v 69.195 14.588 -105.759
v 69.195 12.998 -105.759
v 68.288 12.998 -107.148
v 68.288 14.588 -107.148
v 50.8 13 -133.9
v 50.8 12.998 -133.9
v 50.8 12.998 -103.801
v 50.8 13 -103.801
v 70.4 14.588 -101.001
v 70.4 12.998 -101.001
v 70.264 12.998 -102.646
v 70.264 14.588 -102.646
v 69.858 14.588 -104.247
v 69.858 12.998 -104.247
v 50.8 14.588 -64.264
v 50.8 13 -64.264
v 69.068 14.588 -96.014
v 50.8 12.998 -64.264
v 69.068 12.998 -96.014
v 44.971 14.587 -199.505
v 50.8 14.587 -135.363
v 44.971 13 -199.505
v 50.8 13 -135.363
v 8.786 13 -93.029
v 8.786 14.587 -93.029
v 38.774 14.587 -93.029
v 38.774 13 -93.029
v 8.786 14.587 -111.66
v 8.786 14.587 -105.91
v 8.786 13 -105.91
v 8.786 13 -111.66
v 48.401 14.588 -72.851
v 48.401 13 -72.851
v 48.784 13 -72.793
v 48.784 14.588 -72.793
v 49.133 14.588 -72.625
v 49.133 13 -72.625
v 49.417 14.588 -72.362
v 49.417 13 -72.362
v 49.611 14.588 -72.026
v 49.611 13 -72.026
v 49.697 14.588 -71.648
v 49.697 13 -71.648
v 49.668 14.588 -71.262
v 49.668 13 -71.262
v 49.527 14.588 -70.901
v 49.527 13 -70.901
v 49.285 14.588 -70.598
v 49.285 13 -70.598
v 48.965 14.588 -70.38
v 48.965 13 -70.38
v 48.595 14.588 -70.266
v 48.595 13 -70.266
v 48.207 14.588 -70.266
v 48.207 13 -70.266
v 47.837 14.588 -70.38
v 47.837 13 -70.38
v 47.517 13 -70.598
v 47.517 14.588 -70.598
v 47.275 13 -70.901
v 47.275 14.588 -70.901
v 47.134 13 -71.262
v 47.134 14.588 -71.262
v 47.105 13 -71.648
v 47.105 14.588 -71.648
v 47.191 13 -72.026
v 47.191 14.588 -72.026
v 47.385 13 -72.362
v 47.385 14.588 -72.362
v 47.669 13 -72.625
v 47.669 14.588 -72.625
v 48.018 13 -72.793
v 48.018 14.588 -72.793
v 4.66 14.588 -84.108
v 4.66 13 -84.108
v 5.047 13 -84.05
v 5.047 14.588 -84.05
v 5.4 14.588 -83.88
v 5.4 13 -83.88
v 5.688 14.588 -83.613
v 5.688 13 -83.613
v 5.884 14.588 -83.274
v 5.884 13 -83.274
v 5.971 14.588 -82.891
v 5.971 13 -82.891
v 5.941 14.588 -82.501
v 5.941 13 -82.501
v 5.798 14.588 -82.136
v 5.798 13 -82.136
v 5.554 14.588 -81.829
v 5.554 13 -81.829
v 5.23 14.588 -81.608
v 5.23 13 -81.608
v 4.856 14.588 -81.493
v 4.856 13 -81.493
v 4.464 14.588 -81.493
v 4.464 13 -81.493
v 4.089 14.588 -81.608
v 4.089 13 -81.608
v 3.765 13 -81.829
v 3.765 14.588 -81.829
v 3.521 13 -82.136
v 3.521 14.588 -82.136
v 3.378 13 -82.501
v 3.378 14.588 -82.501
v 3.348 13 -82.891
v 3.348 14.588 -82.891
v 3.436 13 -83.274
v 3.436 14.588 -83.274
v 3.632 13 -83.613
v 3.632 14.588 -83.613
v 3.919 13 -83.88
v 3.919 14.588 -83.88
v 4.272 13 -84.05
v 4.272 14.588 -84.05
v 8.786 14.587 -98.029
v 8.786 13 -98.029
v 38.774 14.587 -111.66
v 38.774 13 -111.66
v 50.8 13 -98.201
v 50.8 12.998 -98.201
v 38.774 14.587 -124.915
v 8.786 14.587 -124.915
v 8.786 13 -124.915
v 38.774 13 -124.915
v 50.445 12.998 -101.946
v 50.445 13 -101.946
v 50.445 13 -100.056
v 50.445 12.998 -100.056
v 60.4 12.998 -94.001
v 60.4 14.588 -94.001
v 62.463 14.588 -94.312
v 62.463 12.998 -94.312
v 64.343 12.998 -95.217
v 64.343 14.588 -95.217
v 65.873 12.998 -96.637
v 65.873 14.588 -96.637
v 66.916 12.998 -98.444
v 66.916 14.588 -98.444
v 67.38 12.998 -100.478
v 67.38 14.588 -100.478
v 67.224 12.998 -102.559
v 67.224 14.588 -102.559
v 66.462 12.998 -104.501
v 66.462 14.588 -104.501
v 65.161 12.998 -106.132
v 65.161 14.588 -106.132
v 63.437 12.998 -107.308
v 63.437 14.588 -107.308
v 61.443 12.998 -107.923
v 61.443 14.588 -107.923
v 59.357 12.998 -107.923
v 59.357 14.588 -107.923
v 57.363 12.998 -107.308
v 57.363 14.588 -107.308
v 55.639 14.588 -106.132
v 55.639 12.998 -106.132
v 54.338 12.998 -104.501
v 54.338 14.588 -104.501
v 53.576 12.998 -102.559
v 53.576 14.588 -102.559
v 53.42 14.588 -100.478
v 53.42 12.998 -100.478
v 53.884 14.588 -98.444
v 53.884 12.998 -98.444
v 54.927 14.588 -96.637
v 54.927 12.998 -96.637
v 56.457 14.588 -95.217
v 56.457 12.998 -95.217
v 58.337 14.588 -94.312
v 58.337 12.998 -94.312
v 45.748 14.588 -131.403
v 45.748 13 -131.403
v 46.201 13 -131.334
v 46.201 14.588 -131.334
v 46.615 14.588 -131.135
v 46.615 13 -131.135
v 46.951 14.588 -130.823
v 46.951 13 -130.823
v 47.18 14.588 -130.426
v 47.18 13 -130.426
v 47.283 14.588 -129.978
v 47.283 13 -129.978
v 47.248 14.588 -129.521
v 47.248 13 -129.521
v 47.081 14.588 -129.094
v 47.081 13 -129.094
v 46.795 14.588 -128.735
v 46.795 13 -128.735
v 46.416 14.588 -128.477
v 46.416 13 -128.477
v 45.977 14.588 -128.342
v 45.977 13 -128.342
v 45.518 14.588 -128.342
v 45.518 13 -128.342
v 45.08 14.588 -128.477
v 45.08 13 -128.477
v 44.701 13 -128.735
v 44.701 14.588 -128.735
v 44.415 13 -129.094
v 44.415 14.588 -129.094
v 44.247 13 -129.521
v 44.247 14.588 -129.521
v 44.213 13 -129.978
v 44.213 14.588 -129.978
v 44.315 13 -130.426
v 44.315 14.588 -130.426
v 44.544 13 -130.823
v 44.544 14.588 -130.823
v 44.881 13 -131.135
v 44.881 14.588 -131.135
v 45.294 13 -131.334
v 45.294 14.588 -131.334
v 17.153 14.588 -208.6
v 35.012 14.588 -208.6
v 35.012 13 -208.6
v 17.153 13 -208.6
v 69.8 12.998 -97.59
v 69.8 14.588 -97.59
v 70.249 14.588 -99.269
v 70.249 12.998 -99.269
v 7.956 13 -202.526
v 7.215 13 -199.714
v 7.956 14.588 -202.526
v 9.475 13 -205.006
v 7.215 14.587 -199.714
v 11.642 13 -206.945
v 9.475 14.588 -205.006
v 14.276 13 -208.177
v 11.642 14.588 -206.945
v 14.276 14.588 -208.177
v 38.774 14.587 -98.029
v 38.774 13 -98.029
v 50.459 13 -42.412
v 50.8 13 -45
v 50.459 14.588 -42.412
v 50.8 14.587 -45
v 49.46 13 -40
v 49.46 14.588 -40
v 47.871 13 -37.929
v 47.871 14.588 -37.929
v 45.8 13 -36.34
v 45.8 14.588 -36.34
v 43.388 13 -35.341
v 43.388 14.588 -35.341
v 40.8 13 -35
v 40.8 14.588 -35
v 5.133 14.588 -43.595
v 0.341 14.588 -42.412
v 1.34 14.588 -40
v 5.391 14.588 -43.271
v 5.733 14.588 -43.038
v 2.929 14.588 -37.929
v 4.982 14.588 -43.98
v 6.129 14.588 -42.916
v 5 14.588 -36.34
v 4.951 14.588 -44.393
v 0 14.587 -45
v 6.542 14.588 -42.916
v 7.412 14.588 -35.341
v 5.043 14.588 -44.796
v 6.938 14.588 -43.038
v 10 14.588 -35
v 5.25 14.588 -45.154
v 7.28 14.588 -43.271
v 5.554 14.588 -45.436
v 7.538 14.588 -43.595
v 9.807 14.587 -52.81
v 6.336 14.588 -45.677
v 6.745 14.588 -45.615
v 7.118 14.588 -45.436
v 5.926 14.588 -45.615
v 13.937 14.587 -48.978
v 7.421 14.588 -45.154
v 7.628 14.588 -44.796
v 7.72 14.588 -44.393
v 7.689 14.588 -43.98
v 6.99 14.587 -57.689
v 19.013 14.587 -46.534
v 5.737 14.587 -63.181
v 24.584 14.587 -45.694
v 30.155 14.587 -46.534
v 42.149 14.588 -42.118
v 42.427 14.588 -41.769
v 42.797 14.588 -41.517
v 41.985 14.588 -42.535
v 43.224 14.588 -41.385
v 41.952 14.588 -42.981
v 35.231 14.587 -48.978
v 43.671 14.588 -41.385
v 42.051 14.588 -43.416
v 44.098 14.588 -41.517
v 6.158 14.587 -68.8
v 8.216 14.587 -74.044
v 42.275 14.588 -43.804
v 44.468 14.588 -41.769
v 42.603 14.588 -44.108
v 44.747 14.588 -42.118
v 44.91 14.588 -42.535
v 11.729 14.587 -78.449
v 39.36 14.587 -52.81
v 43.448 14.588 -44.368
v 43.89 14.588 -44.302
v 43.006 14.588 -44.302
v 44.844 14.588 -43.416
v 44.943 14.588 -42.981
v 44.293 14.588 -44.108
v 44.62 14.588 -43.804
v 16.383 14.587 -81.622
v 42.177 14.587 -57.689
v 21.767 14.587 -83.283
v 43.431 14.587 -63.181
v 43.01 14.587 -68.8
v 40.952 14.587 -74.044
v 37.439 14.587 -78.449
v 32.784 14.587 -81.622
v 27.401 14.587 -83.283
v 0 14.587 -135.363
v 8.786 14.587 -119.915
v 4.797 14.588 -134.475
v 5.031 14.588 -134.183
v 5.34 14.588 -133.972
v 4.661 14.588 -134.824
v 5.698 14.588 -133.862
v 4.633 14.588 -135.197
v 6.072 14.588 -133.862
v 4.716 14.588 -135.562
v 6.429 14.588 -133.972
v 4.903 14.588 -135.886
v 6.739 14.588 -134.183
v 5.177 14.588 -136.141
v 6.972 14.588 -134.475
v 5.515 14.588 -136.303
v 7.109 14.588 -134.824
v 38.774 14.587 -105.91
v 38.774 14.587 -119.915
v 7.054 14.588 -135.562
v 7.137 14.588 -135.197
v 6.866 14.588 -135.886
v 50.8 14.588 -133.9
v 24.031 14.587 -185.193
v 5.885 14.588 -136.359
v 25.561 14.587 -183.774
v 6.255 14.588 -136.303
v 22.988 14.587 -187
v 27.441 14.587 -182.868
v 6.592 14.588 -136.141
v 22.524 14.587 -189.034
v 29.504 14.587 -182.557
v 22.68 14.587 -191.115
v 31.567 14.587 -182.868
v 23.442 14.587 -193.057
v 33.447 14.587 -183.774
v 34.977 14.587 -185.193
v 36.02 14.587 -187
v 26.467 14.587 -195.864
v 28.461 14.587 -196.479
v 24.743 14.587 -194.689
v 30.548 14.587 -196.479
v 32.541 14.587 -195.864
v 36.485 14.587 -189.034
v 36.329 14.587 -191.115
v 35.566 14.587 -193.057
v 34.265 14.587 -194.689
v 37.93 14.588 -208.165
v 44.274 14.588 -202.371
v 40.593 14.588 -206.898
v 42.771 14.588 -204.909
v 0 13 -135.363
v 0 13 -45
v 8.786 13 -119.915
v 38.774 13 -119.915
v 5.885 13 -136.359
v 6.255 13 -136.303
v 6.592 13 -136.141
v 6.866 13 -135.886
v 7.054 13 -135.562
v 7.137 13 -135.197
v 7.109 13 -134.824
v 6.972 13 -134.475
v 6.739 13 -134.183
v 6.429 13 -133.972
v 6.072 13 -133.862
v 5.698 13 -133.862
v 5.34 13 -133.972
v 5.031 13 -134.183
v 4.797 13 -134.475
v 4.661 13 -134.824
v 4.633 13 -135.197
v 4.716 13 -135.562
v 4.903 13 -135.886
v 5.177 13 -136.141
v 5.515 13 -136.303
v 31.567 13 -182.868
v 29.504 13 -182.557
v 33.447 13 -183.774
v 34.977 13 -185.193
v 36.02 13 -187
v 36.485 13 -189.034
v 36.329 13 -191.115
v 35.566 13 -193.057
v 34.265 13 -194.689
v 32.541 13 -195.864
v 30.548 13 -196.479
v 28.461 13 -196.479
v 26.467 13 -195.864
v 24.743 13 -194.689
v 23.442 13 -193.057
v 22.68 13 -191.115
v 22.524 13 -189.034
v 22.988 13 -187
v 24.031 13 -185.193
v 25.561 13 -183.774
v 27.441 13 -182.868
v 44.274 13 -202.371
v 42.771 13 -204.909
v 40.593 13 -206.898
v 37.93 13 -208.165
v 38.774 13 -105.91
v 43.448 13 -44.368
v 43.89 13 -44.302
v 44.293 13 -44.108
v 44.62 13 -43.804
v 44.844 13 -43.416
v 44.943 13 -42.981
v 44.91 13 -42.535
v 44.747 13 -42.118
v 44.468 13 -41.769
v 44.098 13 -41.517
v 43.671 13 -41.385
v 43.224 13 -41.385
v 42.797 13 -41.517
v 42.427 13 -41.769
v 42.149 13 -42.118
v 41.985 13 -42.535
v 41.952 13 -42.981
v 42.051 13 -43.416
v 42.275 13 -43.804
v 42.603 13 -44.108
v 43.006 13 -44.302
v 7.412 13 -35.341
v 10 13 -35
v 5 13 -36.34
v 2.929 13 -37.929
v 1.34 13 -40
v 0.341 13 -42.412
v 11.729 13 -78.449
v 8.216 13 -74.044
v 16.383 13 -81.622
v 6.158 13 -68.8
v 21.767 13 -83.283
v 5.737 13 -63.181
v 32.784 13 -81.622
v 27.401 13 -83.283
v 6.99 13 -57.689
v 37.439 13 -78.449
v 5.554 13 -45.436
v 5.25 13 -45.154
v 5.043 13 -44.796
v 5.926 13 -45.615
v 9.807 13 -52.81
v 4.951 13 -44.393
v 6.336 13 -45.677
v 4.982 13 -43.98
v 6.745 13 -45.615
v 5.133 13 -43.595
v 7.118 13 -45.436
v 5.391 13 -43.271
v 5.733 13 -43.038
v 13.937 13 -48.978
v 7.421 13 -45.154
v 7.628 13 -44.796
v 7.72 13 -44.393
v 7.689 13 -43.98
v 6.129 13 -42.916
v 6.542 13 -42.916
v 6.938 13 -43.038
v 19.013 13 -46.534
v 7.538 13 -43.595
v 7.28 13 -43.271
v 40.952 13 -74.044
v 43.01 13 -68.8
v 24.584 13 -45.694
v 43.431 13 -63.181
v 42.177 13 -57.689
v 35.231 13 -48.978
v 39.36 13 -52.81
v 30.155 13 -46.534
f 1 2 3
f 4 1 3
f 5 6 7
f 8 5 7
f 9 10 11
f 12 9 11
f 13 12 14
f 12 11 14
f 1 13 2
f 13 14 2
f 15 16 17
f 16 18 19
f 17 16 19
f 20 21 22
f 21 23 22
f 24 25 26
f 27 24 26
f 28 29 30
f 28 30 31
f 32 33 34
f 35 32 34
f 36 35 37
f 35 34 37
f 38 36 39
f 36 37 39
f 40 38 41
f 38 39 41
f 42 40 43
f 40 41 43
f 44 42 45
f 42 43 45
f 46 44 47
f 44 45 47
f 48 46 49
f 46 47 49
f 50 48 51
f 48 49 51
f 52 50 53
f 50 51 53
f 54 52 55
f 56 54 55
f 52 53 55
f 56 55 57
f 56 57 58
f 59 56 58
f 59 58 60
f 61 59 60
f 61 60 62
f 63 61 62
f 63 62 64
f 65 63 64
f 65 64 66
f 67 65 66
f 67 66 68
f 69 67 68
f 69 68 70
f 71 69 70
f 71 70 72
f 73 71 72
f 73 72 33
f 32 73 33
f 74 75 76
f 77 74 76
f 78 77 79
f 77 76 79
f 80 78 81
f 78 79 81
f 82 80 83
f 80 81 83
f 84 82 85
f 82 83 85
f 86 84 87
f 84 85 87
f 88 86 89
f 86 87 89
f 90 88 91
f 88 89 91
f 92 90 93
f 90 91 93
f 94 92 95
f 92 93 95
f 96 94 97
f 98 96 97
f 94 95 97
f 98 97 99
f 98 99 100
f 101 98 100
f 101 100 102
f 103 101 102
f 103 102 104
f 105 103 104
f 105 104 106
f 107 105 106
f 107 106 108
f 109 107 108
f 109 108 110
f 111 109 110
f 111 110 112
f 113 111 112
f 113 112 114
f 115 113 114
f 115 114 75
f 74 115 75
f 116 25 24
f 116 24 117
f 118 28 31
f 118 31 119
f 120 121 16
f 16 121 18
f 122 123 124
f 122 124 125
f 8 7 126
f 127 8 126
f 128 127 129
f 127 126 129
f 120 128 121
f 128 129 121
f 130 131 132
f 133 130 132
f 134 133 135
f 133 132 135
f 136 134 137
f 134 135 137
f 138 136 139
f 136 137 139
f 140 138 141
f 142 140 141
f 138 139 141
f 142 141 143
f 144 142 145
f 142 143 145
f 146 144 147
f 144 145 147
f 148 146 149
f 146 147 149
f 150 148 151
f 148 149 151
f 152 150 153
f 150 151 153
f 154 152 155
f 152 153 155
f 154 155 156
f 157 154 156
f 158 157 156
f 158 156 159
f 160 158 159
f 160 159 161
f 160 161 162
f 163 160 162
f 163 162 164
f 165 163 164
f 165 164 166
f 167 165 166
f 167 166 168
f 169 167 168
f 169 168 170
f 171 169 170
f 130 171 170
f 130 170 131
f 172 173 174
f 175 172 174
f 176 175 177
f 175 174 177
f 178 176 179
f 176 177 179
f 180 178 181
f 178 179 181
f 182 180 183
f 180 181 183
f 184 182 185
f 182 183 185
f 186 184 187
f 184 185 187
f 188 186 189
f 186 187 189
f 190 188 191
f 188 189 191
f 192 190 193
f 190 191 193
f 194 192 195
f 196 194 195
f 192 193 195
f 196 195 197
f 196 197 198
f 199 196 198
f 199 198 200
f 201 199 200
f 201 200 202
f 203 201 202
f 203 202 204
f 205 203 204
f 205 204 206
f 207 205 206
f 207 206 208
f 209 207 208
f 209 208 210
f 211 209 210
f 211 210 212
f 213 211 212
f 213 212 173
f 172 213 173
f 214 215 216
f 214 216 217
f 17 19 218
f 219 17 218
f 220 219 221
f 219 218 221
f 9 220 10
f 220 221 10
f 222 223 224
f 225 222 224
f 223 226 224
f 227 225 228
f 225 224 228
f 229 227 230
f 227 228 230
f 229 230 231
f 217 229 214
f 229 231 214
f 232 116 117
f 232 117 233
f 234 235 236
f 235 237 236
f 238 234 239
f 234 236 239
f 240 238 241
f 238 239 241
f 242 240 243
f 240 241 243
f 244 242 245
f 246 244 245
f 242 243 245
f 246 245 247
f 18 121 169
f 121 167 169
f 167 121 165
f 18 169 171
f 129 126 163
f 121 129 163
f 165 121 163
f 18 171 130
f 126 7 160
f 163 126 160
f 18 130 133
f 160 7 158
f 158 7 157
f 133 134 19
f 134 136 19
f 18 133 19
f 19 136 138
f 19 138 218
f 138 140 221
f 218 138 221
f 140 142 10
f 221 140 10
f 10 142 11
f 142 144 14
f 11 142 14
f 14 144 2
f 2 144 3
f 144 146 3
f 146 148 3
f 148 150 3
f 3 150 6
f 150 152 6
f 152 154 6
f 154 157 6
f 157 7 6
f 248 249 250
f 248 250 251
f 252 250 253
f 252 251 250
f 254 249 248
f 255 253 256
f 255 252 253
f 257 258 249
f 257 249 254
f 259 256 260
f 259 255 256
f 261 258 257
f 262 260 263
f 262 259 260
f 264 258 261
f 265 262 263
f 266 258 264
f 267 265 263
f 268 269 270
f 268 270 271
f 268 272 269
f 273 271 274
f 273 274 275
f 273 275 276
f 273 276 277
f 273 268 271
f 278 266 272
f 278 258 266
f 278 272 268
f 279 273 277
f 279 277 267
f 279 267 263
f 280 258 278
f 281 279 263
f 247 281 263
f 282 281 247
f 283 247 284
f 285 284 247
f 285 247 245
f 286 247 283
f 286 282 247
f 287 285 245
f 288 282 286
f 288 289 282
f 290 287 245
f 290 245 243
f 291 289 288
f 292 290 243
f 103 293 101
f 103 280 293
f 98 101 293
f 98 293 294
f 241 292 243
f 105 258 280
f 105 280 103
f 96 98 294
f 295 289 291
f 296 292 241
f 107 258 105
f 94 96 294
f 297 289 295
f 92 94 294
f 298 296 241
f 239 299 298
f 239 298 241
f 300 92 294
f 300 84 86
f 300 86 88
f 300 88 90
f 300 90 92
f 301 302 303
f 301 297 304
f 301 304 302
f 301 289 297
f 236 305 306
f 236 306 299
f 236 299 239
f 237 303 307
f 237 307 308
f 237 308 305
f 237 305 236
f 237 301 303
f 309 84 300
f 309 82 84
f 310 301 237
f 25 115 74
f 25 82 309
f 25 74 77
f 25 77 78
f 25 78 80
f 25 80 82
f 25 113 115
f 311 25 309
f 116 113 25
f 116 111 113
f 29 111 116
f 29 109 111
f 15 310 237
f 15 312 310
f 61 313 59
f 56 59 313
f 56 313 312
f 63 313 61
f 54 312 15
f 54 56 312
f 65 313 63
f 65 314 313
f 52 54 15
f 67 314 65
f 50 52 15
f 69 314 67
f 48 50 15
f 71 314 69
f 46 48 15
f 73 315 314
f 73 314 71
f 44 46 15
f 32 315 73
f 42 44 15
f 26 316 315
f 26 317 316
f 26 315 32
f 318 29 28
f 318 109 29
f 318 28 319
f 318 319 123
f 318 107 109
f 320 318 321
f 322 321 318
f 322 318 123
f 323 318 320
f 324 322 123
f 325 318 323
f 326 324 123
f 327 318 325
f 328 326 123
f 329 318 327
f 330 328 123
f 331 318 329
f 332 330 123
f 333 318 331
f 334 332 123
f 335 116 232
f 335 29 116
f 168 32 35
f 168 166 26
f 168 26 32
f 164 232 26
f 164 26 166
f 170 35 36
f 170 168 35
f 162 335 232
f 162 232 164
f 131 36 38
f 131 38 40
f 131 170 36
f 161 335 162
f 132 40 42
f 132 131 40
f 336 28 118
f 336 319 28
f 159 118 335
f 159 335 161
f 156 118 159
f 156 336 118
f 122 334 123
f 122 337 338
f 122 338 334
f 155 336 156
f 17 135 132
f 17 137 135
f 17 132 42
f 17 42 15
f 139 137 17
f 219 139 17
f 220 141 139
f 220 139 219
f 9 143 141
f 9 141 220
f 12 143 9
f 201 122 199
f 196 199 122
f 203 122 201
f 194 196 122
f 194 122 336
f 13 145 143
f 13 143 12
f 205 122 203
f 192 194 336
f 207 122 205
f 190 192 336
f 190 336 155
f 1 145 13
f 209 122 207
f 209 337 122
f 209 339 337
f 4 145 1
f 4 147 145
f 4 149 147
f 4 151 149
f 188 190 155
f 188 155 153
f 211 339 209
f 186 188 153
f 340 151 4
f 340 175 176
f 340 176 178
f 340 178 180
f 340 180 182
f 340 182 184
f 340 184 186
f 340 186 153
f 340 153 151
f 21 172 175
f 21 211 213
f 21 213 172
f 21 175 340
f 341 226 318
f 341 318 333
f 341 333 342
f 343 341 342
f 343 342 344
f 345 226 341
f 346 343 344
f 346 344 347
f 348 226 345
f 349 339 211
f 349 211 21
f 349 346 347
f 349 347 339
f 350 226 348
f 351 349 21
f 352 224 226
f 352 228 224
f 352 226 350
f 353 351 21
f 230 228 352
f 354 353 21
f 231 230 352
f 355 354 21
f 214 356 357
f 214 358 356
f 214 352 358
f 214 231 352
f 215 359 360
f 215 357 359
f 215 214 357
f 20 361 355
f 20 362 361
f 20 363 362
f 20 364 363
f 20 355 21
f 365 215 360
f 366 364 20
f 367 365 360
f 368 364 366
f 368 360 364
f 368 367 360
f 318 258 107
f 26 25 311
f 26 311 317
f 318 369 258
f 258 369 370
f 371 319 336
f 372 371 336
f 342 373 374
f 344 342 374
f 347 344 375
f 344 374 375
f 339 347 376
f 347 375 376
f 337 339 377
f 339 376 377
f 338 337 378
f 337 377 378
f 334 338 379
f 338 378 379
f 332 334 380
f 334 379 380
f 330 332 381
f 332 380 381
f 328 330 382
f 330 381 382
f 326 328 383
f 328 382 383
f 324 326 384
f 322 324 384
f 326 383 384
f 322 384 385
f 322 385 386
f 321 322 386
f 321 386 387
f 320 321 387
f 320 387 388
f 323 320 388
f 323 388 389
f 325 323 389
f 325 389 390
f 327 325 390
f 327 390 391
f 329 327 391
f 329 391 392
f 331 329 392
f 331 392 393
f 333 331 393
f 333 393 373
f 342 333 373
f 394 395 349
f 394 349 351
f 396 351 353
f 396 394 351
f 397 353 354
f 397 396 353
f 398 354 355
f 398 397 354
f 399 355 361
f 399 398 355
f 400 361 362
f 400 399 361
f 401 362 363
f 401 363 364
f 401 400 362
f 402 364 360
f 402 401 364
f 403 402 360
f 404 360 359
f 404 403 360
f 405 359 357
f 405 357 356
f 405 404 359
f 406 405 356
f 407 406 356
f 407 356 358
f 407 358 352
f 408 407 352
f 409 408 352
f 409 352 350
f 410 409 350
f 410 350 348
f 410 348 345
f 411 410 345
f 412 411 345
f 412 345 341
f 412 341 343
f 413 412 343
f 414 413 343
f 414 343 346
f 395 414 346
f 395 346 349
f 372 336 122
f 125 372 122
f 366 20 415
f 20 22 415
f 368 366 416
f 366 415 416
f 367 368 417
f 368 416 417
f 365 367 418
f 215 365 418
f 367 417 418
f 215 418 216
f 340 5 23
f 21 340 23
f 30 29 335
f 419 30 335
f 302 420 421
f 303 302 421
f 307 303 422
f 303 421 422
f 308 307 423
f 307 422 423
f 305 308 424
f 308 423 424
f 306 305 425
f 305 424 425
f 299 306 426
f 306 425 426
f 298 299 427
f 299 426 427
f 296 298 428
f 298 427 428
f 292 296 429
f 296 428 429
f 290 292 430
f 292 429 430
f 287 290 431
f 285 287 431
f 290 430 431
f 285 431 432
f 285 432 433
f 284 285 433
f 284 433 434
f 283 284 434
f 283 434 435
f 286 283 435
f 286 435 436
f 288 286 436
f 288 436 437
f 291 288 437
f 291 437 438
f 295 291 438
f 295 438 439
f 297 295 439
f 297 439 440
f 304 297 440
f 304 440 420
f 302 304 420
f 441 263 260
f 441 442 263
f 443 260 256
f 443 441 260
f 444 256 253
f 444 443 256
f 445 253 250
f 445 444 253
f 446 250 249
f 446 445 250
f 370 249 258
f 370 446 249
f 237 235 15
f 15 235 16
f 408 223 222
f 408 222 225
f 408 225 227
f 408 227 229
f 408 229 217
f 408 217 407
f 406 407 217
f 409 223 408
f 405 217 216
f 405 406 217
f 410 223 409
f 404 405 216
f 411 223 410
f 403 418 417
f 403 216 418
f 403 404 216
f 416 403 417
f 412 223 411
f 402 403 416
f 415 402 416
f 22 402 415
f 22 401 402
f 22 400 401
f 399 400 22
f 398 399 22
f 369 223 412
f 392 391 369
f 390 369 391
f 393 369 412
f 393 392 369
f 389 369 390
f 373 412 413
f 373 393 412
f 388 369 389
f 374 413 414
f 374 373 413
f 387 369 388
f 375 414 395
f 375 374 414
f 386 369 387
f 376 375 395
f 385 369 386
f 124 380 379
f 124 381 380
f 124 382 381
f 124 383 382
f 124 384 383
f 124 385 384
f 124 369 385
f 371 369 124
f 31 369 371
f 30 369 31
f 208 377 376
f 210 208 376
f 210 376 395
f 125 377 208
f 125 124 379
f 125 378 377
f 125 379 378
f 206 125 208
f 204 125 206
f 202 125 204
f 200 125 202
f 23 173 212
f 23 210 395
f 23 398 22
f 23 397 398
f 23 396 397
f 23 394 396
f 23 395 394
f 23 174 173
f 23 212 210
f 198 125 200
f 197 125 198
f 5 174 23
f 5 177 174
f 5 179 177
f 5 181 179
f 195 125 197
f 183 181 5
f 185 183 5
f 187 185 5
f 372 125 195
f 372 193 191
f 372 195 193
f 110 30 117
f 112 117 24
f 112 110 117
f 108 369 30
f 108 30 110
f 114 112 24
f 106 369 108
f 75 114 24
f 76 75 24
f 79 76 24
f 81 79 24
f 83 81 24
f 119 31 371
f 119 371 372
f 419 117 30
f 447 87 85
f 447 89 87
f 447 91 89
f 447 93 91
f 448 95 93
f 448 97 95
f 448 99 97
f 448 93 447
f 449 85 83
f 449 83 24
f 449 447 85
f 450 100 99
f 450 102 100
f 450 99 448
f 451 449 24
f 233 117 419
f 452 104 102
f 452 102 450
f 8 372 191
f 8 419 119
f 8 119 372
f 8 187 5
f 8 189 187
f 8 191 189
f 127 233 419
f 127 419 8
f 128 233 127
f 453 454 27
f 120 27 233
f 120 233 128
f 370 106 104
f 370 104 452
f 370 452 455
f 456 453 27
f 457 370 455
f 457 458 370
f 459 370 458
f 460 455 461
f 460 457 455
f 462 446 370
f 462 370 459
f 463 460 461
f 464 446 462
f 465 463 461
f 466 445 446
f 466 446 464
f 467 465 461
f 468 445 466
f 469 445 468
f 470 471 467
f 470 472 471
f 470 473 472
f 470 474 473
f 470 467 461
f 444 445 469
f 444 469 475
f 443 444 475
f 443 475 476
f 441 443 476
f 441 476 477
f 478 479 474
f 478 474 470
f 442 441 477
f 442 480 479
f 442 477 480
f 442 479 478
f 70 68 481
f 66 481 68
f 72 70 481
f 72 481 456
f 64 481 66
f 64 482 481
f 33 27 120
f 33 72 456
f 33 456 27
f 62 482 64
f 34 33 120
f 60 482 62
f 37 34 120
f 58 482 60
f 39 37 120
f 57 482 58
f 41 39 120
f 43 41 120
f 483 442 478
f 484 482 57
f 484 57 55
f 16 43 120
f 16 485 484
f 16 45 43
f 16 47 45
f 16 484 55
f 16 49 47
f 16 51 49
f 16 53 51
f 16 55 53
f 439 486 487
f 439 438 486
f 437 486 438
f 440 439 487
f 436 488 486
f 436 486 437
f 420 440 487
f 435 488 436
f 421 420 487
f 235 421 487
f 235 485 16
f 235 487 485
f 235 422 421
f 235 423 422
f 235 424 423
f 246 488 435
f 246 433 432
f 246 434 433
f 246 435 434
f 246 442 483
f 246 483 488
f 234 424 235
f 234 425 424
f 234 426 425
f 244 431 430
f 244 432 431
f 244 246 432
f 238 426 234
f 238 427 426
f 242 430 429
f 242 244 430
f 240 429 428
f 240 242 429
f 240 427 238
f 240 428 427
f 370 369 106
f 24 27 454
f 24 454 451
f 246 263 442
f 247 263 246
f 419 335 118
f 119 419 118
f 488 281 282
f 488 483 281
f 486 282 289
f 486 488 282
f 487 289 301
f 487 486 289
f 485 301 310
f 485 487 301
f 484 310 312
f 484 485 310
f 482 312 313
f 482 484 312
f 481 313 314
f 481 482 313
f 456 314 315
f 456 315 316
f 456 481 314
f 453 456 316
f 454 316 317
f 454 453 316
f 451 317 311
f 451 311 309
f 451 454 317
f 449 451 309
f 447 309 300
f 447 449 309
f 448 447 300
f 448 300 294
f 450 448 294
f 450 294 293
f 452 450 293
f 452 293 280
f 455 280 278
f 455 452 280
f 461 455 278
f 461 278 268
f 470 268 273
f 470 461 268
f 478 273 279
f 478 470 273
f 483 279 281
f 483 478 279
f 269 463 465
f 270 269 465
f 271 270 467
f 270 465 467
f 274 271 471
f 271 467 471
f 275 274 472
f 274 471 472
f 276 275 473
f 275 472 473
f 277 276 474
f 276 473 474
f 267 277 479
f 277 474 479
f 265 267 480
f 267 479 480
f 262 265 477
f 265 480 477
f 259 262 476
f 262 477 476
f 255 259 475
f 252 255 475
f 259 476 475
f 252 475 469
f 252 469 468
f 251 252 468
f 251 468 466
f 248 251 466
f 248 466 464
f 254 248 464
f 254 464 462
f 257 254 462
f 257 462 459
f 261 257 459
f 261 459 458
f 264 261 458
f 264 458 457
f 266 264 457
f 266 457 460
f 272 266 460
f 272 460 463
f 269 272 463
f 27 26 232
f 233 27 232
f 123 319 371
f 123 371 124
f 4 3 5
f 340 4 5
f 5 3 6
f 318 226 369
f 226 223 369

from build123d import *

# Parameters (mm, degrees)
SKETCH1_R           = 2.875
SKETCH1_R_2         = 7
BOSS_EXTRUDE1_DEPTH = 24.5875
SKETCH4_W           = 66.272407177
SKETCH4_H           = 27.800260981
CUT_EXTRUDE2_DEPTH  = 20
FILLET3_R           = 10
FILLET4_R           = 10
BOSS_EXTRUDE3_START = -1.5875
BOSS_EXTRUDE3_DEPTH = 1.5875
SKETCH7_R           = 7
CUT_EXTRUDE3_DEPTH  = 1.5875
CUT_EXTRUDE4_START  = -10
SKETCH8_R           = 3
SKETCH8_R_2         = 18.9
SKETCH8_R_3         = 2.875
SKETCH8_R_4         = 7
CUT_EXTRUDE4_DEPTH  = 10
SKETCH9_W           = 229.1070397
SKETCH9_H           = 361.266964835
SKETCH9_R           = 1.388229101
SKETCH9_R_2         = 1.483383261
SKETCH9_R_3         = 1.314910669
SKETCH9_R_4         = 1.248623853
SKETCH9_R_5         = 1.255629307
SKETCH9_R_6         = 1.53911217
CUT_EXTRUDE5_DEPTH  = 13
SKETCH10_W          = 29.988446547
SKETCH10_H          = 5
SKETCH10_H_2        = 5.75
CUT_EXTRUDE6_DEPTH  = 22
SKETCH11_R          = 5.236653548
CUT_EXTRUDE7_DEPTH  = 10
BOSS_EXTRUDE4_START = -1.59
BOSS_EXTRUDE4_DEPTH = 1.59
SKETCH13_R          = 7
CUT_EXTRUDE8_DEPTH  = 41
SKETCH14_W          = 61.491848917
SKETCH14_H          = 35.587491391
CUT_EXTRUDE9_DEPTH  = 20
FILLET5_R           = 10
SKETCH16_W          = 163.723031551
SKETCH16_H          = 22.872070304
CUT_EXTRUDE11_DEPTH = 35
FILLET6_R           = 10
SKETCH17_R          = 1.53911217
SKETCH17_R_2        = 1.255629307
SKETCH17_R_3        = 1.3
SKETCH17_R_4        = 1.314910669
SKETCH17_R_5        = 1.388229101
SKETCH17_R_6        = 1.5
CUT_EXTRUDE12_DEPTH = 42
CUT_EXTRUDE13_START = -30
SKETCH18_R          = 18.9
CUT_EXTRUDE13_DEPTH = 30


with BuildPart() as part:
    # Sketch1 → Boss-Extrude1 (new body)
    with BuildSketch(Plane(origin=(0, 0, 0), x_dir=(1, 0, 0), z_dir=(0, 1, 0))):
        with BuildLine():
            Line((42.32729629, 228.6), (10.454309325, 228.6))
            Line((10.454309325, 228.6), (0, 135.362739137))
            Line((0, 135.362739137), (0, 0))
            Line((0, 0), (24.327009544, 0))
            Line((24.327009544, 0), (50.8, 0))
            Line((50.8, 0), (50.8, 64.87909603))
            Line((50.8, 64.87909603), (50.8, 87.423477361))
            Line((50.8, 87.423477361), (50.8, 98.200996728))
            ThreePointArc((50.8, 98.200996728), (50.4, 101.000996728), (50.8, 103.800996728))
            Line((50.8, 103.800996728), (50.8, 104.488200565))
            Line((50.8, 104.488200565), (50.8, 120.619222808))
            Line((50.8, 120.619222808), (50.8, 135.362739137))
            Line((50.8, 135.362739137), (42.32729629, 228.6))
        make_face()
        with Locations(Location((24.101759227, 108.78493524, 0), (0, 0, 270))):
            Circle(SKETCH1_R, mode=Mode.SUBTRACT)
        with Locations(Location((29.504213454, 189.557234372, 0), (0, 0, 270))):
            Circle(SKETCH1_R_2, mode=Mode.SUBTRACT)
    extrude(amount=BOSS_EXTRUDE1_DEPTH)

    # Sketch4 → Cut-Extrude2 (cut)
    with BuildSketch(Plane(origin=(0, 0, -228.6), x_dir=(-1, 0, 0), z_dir=(0, 0, -1))):
        with Locations((-28.174690156, -1.980940155)):
            Rectangle(SKETCH4_W, SKETCH4_H)
    extrude(amount=-CUT_EXTRUDE2_DEPTH, mode=Mode.SUBTRACT)

    # Fillet3
    fillet3_edges = [part.edges().sort_by_distance(p)[0] for p in [
        (44.144746445, 5.959595168, -208.6),
    ]]
    fillet(fillet3_edges, radius=FILLET3_R)

    # Fillet4
    fillet4_edges = [part.edges().sort_by_distance(p)[0] for p in [
        (50.8, 12.29375, 0),
        (0, 12.29375, 0),
        (8.211791854, 5.959595168, -208.6),
    ]]
    fillet(fillet4_edges, radius=FILLET4_R)

    # Sketch6 → Boss-Extrude3 (add)
    with BuildSketch(Plane(origin=(0, 24.5875, 0), x_dir=(1, 0, 0), z_dir=(0, 1, 0)).offset(BOSS_EXTRUDE3_START)):
        with BuildLine():
            Line((50.8, 135.362739137), (50.8, 103.800996728))
            ThreePointArc((50.8, 103.800996728), (50.4, 101.000996728), (50.8, 98.200996728))
            Line((50.8, 98.200996728), (50.8, 61.124243317))
            Line((50.8, 61.124243317), (69.258211507, 96.360728536))
            ThreePointArc((69.258211507, 96.360728536), (70.393157133, 101.370875786), (68.890940865, 106.283413148))
            Line((68.890940865, 106.283413148), (50.8, 135.362739137))
        make_face()
    extrude(amount=BOSS_EXTRUDE3_DEPTH)

    # Sketch7 → Cut-Extrude3 (cut)
    with BuildSketch(Plane(origin=(0, 24.5875, 0), x_dir=(1, 0, 0), z_dir=(0, 1, 0))):
        with Locations(Location((60.4, 101.000996728, 0), (0, 0, 270))):
            Circle(SKETCH7_R)
    extrude(amount=-CUT_EXTRUDE3_DEPTH, mode=Mode.SUBTRACT)

    # Sketch8 → Cut-Extrude4 (cut)
    with BuildSketch(Plane(origin=(0, 24.5875, 0), x_dir=(1, 0, 0), z_dir=(0, 1, 0)).offset(CUT_EXTRUDE4_START)):
        with BuildLine():
            Line((10.454309325, 228.6), (0, 135.362739137))
            Line((0, 135.362739137), (0, 10))
            ThreePointArc((0, 10), (2.928932188, 2.928932188), (10, 0))
            Line((10, 0), (40.8, 0))
            ThreePointArc((40.8, 0), (47.871067812, 2.928932188), (50.8, 10))
            Line((50.8, 10), (50.8, 61.124243317))
            Line((50.8, 61.124243317), (69.258211507, 96.360728536))
            ThreePointArc((69.258211507, 96.360728536), (70.393157133, 101.370875786), (68.890940865, 106.283413148))
            Line((68.890940865, 106.283413148), (50.8, 135.362739137))
            Line((50.8, 135.362739137), (42.32729629, 228.6))
            Line((42.32729629, 228.6), (10.454309325, 228.6))
        make_face()
        with Locations(Location((9.492033273, 118.909935242, 0), (0, 0, 270))):
            Circle(SKETCH8_R, mode=Mode.SUBTRACT)
        with Locations(Location((24.583834565, 64.593886665, 0), (0, 0, 270))):
            Circle(SKETCH8_R_2, mode=Mode.SUBTRACT)
        with Locations(Location((24.101759227, 108.78493524, 0), (0, 0, 270))):
            Circle(SKETCH8_R_3, mode=Mode.SUBTRACT)
        with Locations((60.4, 101.000996728)):
            Circle(SKETCH8_R_4, mode=Mode.SUBTRACT)
        with Locations(Location((29.504213454, 189.557234372, 0), (0, 0, 270))):
            Circle(SKETCH8_R_4, mode=Mode.SUBTRACT)
    extrude(amount=CUT_EXTRUDE4_DEPTH, mode=Mode.SUBTRACT)

    # Sketch9 → Cut-Extrude5 (cut)
    with BuildSketch(Plane.XZ):
        with Locations((19.903204009, -125.752229467)):
            Rectangle(SKETCH9_W, SKETCH9_H)
        with Locations(Location((6.335590122, -44.288799513, 0), (0, 0, 270))):
            Circle(SKETCH9_R, mode=Mode.SUBTRACT)
        with Locations(Location((43.447673368, -42.868436544, 0), (0, 0, 270))):
            Circle(SKETCH9_R_2, mode=Mode.SUBTRACT)
        with Locations(Location((4.659546827, -82.793173401, 0), (0, 0, 270))):
            Circle(SKETCH9_R_3, mode=Mode.SUBTRACT)
        with Locations(Location((48.400988852, -71.551011715, 0), (0, 0, 270))):
            Circle(SKETCH9_R_4, mode=Mode.SUBTRACT)
        with Locations(Location((5.88467603, -135.103145298, 0), (0, 0, 270))):
            Circle(SKETCH9_R_5, mode=Mode.SUBTRACT)
        with Locations(Location((45.747747887, -129.863467374, 0), (0, 0, 270))):
            Circle(SKETCH9_R_6, mode=Mode.SUBTRACT)
    extrude(amount=-CUT_EXTRUDE5_DEPTH, mode=Mode.SUBTRACT)

    # Sketch10 → Cut-Extrude6 (cut)
    with BuildSketch(Plane(origin=(0, 24.5875, 0), x_dir=(1, 0, 0), z_dir=(0, 1, 0))):
        with Locations((23.779803557, 122.41493524)):
            Rectangle(SKETCH10_W, SKETCH10_H)
        with Locations((23.779803557, 108.78493524)):
            Rectangle(SKETCH10_W, SKETCH10_H_2)
        with Locations((23.779803557, 95.528937895)):
            Rectangle(SKETCH10_W, SKETCH10_H)
    extrude(amount=-CUT_EXTRUDE6_DEPTH, mode=Mode.SUBTRACT)

    # Sketch11 → Cut-Extrude7 (cut)
    with BuildSketch(Plane(origin=(0, 24.5875, 0), x_dir=(1, 0, 0), z_dir=(0, 1, 0))):
        with Locations((8.535526315, 118.29502971)):
            Circle(SKETCH11_R)
    extrude(amount=-CUT_EXTRUDE7_DEPTH, mode=Mode.SUBTRACT)

    # Sketch12 → Boss-Extrude4 (add)
    with BuildSketch(Plane(origin=(0, 14.5875, 0), x_dir=(1, 0, 0), z_dir=(0, 1, 0)).offset(BOSS_EXTRUDE4_START)):
        with BuildLine():
            Line((68.287536191, 107.148091395), (50.8, 133.900488173))
            Line((50.8, 133.900488173), (50.8, 103.800996728))
            ThreePointArc((50.8, 103.800996728), (58.520134646, 110.822712782), (68.287536191, 107.148091395))
        make_face()
        with BuildLine():
            Line((69.19540964, 105.759228466), (68.287536191, 107.148091395))
            ThreePointArc((68.287536191, 107.148091395), (58.520134646, 110.822712782), (50.8, 103.800996728))
            ThreePointArc((50.8, 103.800996728), (50.4, 101.000996728), (50.8, 98.200996728))
            ThreePointArc((50.8, 98.200996728), (59.211240578, 91.07190558), (69.067690563, 96.013899345))
            ThreePointArc((69.067690563, 96.013899345), (70.061182785, 98.419999404), (70.4, 101.000996728))
            ThreePointArc((70.4, 101.000996728), (70.094175994, 103.455167016), (69.19540964, 105.759228466))
        make_face()
        with BuildLine():
            ThreePointArc((69.067690563, 96.013899345), (59.211240578, 91.07190558), (50.8, 98.200996728))
            Line((50.8, 98.200996728), (50.8, 64.264230765))
            Line((50.8, 64.264230765), (69.067690563, 96.013899345))
        make_face()
    extrude(amount=BOSS_EXTRUDE4_DEPTH)

    # Sketch13 → Cut-Extrude8 (cut)
    with BuildSketch(Plane(origin=(0, 14.5875, 0), x_dir=(1, 0, 0), z_dir=(0, 1, 0))):
        with Locations(Location((60.4, 101.000996728, 0), (0, 0, 270))):
            Circle(SKETCH13_R)
    extrude(amount=-CUT_EXTRUDE8_DEPTH, mode=Mode.SUBTRACT)

    # Sketch14 → Cut-Extrude9 (cut)
    with BuildSketch(Plane(origin=(0, 0, -228.6), x_dir=(-1, 0, 0), z_dir=(0, 0, -1))):
        with Locations((-33.296946078, 21.381494753)):
            Rectangle(SKETCH14_W, SKETCH14_H)
    extrude(amount=-CUT_EXTRUDE9_DEPTH, mode=Mode.SUBTRACT)

    # Fillet5
    fillet5_edges = [part.edges().sort_by_distance(p)[0] for p in [
        (44.144746445, 13.79375, -208.6),
        (8.211791854, 13.79375, -208.6),
    ]]
    fillet(fillet5_edges, radius=FILLET5_R)

    # Sketch16 → Cut-Extrude11 (cut)
    with BuildSketch(Plane.XY):
        with Locations((6.935844153, 9.456999915)):
            Rectangle(SKETCH16_W, SKETCH16_H)
    extrude(amount=-CUT_EXTRUDE11_DEPTH, mode=Mode.SUBTRACT)

    # Fillet6
    fillet6_edges = [part.edges().sort_by_distance(p)[0] for p in [
        (0, 13.79375, -35),
        (50.8, 13.79375, -35),
    ]]
    fillet(fillet6_edges, radius=FILLET6_R)

    # Sketch17 → Cut-Extrude12 (cut)
    with BuildSketch(Plane.XZ):
        with Locations(Location((45.747747887, -129.863467374, 0), (0, 0, 270))):
            Circle(SKETCH17_R)
        with Locations(Location((5.88467603, -135.103145298, 0), (0, 0, 270))):
            Circle(SKETCH17_R_2)
        with Locations(Location((48.400988852, -71.551011715, 0), (0, 0, 270))):
            Circle(SKETCH17_R_3)
        with Locations(Location((4.659546827, -82.793173401, 0), (0, 0, 270))):
            Circle(SKETCH17_R_4)
        with Locations(Location((6.335590122, -44.288799513, 0), (0, 0, 270))):
            Circle(SKETCH17_R_5)
        with Locations(Location((43.447673368, -42.868436544, 0), (0, 0, 270))):
            Circle(SKETCH17_R_6)
    extrude(amount=-CUT_EXTRUDE12_DEPTH, mode=Mode.SUBTRACT)

    # Sketch18 → Cut-Extrude13 (cut)
    with BuildSketch(Plane(origin=(0, 24.5875, 0), x_dir=(1, 0, 0), z_dir=(0, 1, 0)).offset(CUT_EXTRUDE13_START)):
        with Locations(Location((24.583834565, 64.593886665, 0), (0, 0, 270))):
            Circle(SKETCH18_R)
    extrude(amount=CUT_EXTRUDE13_DEPTH, mode=Mode.SUBTRACT)


solid = part.part
